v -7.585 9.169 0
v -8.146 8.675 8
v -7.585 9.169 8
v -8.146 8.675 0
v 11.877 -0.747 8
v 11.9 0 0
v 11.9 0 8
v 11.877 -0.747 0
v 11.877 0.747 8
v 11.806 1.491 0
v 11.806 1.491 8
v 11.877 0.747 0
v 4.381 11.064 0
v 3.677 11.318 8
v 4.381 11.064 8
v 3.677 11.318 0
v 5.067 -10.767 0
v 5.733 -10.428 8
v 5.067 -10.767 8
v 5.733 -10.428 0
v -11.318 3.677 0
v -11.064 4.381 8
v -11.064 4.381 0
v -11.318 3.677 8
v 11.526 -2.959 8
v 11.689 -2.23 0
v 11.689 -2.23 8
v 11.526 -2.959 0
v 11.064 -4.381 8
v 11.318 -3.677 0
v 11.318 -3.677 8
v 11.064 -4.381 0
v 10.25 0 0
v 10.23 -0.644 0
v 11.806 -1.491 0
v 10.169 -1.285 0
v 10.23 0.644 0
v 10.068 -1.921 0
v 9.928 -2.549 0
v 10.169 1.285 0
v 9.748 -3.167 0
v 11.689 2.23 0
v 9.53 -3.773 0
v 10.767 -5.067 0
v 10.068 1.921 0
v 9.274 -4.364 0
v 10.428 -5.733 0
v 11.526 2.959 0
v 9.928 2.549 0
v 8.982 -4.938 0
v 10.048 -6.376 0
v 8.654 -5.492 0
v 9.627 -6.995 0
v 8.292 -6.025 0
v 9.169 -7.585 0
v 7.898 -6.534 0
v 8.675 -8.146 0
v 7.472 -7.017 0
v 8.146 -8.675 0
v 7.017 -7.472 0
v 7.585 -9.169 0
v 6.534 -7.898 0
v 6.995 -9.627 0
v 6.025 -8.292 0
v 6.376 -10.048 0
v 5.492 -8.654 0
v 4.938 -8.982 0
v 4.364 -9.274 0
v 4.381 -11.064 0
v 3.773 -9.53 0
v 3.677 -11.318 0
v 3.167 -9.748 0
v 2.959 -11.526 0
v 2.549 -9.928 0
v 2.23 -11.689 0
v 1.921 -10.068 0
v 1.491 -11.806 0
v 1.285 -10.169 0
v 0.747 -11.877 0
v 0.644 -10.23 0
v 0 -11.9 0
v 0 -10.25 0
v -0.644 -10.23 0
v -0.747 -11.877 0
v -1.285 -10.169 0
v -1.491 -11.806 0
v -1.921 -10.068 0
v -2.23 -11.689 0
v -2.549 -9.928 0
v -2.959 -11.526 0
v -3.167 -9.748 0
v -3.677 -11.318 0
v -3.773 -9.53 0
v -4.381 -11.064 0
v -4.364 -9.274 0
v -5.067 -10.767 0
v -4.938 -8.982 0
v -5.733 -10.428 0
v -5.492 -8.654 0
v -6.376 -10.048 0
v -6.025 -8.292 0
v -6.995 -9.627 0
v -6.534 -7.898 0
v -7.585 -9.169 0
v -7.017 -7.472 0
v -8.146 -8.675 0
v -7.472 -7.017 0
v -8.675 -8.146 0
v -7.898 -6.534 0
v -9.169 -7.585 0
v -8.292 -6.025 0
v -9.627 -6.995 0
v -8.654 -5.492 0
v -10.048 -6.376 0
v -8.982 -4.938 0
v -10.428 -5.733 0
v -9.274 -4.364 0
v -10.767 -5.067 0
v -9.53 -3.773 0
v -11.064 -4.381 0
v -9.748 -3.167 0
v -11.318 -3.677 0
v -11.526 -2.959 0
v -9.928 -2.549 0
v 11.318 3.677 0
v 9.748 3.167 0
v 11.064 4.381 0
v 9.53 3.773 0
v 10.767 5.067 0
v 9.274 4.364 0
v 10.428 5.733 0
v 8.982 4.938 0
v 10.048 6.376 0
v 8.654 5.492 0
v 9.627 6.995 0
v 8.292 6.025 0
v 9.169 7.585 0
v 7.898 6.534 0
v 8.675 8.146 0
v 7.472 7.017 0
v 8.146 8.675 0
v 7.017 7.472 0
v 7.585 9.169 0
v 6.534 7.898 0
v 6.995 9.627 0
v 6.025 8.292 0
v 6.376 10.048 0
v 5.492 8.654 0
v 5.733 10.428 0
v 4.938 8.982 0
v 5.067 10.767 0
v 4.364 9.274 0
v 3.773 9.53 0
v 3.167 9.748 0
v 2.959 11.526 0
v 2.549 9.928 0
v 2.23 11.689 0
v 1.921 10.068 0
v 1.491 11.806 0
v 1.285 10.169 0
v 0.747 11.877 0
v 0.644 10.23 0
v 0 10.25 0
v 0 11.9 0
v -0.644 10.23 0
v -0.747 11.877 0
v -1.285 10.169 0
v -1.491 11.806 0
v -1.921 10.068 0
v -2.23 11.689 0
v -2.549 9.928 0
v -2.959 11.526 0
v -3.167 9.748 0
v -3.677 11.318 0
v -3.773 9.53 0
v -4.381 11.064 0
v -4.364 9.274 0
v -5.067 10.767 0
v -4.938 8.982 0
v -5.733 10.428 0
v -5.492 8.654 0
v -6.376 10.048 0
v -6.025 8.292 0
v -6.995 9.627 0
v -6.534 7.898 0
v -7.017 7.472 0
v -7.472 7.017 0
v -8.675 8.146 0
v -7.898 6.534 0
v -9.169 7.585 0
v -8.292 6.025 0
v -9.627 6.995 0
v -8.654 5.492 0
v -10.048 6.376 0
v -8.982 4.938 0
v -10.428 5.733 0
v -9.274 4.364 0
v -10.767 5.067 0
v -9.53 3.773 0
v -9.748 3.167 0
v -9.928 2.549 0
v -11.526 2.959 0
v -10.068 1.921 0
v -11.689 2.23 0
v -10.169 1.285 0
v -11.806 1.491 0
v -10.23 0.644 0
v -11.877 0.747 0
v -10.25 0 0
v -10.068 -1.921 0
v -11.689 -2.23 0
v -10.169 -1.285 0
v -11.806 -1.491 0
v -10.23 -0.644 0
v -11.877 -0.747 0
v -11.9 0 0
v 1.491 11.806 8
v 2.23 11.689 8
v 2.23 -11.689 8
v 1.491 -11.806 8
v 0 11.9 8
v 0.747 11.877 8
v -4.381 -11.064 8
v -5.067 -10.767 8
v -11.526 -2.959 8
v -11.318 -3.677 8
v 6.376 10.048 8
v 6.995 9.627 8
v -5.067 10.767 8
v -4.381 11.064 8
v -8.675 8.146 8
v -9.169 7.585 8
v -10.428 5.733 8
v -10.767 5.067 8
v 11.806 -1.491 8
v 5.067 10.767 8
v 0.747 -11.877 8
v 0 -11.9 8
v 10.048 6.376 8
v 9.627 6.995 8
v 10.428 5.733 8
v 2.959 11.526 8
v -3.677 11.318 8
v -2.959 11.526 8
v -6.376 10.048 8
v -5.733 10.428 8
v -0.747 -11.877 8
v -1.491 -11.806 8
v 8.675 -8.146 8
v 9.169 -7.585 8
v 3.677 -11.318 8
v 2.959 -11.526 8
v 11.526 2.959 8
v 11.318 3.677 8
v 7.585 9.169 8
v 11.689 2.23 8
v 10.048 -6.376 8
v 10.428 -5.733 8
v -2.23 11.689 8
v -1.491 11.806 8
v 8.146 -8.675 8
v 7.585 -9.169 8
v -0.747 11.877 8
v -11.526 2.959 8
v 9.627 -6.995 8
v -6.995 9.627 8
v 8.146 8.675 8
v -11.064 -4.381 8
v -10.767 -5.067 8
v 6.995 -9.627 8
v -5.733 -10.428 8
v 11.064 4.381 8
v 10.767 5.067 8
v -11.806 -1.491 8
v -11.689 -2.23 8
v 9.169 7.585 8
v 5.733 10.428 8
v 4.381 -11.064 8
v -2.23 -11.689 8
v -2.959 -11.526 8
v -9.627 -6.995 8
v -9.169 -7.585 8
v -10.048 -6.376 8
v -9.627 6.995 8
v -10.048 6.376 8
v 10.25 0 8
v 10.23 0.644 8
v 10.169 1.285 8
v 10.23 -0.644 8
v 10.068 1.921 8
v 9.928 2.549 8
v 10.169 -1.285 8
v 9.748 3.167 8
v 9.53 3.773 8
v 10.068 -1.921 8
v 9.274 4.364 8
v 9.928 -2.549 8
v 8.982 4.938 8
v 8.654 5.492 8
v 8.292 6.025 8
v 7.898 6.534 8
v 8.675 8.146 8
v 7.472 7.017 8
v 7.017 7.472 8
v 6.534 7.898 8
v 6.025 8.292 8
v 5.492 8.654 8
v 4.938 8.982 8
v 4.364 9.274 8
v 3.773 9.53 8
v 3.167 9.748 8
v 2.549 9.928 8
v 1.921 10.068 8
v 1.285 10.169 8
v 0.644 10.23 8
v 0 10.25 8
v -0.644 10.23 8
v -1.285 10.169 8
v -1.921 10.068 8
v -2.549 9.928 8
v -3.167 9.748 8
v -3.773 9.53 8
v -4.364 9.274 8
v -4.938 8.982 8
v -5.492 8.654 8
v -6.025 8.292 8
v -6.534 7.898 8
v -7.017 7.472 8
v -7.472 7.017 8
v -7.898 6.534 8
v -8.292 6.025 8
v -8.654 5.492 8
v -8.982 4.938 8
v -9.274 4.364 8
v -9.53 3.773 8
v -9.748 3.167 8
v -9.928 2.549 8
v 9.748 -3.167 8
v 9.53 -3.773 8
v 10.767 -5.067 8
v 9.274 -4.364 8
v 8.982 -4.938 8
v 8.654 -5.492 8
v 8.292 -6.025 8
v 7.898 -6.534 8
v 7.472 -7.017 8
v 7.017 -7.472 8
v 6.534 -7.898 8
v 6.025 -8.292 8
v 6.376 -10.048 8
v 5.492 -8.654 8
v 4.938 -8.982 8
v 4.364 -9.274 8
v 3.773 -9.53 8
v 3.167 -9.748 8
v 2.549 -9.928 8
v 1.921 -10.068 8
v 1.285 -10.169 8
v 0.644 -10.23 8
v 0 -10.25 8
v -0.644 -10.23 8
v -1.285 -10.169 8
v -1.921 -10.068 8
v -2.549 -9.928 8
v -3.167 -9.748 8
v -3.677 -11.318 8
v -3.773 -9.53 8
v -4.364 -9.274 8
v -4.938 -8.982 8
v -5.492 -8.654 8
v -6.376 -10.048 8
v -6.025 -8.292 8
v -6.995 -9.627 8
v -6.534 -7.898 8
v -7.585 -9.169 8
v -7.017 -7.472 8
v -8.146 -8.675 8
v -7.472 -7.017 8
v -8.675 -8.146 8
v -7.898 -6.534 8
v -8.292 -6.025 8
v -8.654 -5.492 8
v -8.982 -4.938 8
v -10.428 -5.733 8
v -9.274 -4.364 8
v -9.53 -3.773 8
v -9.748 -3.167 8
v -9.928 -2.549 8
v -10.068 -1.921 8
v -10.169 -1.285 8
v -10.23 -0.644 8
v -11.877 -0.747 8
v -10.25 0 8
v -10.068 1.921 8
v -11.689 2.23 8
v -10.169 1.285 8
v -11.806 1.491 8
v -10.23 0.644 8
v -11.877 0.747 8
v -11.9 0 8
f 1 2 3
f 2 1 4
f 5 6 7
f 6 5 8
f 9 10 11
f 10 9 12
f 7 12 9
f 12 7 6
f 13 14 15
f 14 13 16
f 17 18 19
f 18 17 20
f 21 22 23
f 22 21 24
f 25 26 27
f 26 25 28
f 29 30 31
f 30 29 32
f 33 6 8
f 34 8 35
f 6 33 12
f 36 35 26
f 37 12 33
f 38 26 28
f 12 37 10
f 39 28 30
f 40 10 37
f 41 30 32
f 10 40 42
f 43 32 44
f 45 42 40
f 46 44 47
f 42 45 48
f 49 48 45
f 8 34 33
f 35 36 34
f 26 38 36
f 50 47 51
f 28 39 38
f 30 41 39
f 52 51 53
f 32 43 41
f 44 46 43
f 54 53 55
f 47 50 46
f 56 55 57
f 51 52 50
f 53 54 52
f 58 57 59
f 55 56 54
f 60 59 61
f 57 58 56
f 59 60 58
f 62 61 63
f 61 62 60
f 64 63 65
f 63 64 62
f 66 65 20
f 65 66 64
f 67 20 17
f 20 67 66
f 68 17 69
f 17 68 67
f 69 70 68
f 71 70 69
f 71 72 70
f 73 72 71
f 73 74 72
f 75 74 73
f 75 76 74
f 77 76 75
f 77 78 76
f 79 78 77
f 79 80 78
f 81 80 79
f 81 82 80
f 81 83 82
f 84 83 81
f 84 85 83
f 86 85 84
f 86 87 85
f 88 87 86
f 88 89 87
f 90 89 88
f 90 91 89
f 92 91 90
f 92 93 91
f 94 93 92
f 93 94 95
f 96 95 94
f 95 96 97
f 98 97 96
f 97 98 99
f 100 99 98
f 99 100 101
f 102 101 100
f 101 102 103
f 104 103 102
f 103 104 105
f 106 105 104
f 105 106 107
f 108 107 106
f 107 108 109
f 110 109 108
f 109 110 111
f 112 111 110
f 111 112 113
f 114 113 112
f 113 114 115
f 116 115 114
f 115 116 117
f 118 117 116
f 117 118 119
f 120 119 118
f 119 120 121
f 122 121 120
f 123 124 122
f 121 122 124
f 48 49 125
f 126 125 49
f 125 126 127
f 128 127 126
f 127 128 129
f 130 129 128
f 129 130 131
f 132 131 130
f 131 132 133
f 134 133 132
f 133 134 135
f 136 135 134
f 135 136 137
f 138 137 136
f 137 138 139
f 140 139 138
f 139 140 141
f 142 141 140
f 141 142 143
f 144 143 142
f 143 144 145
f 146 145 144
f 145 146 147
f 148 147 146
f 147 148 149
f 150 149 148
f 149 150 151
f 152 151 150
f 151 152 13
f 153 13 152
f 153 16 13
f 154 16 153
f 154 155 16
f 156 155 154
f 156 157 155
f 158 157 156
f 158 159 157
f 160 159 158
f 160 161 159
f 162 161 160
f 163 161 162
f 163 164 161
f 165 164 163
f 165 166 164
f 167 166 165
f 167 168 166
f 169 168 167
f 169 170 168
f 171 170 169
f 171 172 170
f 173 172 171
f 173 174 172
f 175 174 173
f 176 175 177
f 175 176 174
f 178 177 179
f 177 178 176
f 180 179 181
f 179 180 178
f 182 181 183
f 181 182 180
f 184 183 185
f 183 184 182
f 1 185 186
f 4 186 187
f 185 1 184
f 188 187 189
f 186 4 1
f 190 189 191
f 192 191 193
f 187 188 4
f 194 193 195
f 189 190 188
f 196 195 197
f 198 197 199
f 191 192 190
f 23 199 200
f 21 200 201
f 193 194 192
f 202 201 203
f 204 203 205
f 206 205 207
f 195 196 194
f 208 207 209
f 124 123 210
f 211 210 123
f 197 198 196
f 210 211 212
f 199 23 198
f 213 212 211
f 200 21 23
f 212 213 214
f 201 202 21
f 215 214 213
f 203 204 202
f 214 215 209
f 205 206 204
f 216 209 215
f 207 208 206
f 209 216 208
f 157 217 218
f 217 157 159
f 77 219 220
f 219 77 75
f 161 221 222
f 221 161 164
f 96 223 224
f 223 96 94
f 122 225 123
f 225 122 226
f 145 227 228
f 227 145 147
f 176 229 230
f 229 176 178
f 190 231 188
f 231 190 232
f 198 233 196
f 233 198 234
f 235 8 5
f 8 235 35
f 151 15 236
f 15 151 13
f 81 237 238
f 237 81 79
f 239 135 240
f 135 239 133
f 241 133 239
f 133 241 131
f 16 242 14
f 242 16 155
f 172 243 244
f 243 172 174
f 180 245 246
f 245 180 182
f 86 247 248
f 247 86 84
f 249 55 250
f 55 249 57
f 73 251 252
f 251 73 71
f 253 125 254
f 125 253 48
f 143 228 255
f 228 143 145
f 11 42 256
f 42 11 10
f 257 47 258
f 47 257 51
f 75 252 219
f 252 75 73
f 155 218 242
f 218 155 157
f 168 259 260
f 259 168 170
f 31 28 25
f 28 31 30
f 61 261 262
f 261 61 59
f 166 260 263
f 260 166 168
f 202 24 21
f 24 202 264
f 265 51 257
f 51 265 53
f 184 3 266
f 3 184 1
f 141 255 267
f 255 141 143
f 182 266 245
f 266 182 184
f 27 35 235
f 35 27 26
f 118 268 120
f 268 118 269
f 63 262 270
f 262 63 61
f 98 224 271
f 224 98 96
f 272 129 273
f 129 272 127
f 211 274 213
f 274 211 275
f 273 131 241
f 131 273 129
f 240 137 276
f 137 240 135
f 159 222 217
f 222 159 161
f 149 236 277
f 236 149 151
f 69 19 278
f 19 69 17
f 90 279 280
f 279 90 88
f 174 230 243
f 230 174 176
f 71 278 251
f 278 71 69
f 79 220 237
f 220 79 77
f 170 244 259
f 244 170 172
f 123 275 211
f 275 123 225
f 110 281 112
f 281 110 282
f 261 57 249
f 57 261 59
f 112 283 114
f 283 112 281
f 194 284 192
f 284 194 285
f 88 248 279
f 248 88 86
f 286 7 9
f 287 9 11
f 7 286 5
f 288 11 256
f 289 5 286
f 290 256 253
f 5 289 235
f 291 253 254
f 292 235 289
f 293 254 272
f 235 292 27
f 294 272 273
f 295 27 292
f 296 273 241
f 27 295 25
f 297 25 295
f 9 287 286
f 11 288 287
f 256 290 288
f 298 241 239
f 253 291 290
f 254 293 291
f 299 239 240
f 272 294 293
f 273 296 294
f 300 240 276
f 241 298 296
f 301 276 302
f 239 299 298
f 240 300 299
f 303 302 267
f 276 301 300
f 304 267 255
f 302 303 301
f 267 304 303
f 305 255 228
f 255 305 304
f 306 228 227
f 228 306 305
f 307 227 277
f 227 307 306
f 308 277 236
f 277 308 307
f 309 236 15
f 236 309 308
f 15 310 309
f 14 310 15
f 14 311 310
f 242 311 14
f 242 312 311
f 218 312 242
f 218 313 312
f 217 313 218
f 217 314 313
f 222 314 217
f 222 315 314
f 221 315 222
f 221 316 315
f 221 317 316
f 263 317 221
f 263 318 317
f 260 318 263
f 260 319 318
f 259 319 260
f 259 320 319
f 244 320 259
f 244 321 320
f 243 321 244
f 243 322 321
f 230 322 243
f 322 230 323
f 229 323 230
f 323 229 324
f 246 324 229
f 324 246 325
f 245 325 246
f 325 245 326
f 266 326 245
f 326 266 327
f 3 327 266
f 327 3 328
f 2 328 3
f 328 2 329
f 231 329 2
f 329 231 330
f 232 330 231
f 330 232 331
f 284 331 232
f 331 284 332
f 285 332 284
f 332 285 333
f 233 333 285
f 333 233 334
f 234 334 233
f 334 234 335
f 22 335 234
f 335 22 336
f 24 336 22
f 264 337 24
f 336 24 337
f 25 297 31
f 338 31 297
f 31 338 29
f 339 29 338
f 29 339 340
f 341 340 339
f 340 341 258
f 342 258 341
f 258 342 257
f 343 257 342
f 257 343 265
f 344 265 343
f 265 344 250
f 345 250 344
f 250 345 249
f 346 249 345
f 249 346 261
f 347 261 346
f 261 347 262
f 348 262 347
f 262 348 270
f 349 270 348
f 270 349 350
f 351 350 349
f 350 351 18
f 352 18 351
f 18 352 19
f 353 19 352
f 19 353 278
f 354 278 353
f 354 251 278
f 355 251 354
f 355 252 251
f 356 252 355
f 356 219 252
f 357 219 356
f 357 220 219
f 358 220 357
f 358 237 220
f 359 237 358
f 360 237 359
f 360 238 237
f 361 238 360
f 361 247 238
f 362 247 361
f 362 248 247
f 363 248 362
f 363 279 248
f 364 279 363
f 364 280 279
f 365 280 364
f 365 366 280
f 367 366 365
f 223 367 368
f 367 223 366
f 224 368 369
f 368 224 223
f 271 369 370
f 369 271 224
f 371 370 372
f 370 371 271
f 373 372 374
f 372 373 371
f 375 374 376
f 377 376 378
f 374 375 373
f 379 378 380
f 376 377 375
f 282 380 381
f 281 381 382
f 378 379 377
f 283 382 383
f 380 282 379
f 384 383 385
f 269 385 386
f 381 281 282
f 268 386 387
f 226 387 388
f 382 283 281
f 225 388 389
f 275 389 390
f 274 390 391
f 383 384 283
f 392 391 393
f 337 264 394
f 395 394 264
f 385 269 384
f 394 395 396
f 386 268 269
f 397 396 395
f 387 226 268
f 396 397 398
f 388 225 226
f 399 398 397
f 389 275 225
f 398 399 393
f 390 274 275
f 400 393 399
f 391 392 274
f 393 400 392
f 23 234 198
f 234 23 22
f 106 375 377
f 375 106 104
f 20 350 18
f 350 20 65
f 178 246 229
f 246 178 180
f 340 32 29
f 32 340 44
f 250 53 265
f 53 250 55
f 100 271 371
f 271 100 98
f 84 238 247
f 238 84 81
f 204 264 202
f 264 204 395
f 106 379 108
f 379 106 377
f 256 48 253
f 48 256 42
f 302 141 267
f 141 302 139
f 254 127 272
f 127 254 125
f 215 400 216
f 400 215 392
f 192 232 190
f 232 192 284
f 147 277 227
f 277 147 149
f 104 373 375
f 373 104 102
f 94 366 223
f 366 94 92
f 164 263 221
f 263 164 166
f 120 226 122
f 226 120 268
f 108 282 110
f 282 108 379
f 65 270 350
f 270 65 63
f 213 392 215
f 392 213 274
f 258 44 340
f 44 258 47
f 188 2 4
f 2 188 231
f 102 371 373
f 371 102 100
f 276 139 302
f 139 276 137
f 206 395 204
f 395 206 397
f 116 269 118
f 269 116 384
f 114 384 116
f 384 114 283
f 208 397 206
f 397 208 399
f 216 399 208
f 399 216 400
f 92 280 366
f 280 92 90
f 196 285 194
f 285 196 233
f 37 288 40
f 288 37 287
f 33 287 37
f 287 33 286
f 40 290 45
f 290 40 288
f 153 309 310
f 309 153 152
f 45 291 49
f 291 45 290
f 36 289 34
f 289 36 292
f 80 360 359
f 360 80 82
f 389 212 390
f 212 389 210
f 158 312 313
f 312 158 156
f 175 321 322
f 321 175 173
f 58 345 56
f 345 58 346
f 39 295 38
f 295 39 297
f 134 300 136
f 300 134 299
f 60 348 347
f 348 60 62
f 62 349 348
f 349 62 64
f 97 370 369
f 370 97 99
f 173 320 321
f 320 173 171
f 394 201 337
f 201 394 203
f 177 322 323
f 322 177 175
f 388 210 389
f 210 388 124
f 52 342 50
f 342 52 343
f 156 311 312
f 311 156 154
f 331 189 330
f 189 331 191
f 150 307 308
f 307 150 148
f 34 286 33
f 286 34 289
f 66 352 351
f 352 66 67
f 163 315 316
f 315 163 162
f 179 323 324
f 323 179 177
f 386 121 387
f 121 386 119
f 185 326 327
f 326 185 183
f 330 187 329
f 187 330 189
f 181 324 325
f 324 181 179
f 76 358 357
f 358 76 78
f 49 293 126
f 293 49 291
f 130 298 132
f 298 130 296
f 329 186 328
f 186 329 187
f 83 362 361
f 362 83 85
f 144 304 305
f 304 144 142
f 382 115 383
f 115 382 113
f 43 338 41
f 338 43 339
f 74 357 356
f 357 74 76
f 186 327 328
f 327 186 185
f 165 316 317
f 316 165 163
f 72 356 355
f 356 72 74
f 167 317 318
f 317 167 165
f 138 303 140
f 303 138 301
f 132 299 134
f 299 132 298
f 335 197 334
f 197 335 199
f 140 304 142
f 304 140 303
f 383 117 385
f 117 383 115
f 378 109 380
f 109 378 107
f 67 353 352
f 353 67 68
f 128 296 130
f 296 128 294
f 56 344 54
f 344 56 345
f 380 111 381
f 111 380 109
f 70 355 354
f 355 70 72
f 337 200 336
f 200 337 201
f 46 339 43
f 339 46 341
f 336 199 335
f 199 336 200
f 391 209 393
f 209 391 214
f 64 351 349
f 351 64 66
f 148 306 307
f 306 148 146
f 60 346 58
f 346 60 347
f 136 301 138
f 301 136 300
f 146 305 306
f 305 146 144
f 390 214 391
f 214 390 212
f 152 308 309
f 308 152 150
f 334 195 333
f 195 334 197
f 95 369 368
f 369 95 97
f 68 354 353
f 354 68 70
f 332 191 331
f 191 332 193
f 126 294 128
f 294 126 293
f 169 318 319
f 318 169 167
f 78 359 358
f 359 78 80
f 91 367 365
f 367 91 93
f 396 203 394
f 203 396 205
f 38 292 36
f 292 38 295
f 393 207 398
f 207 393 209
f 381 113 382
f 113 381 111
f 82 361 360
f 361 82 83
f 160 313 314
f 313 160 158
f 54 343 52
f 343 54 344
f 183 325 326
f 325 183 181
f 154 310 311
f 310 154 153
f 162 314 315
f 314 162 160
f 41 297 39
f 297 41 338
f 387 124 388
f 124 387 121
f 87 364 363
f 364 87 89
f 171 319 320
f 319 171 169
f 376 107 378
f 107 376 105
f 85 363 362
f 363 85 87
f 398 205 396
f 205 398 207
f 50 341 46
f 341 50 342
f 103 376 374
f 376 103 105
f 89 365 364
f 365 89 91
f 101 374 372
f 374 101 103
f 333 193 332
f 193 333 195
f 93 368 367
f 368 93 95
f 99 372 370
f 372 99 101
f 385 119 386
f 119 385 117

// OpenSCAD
ringInnerDiameter = 20.5;
ringThickness = 1.65;
ringOuterDiameter = ringInnerDiameter + ringThickness * 2;
ringWidth = 8;

cutHeight = 8;
cutterWidth = 10;

innerWallHeight = 0.8;
innerWallWidth = cutterWidth;

difference() {
    cylinder(h=ringWidth, r=ringOuterDiameter / 2, $fn=100); // outer cylinder     
    cylinder(h=ringWidth * 69, r=ringInnerDiameter / 2, $fn=100); // inner cylinder
    
    translate([-cutterWidth/2, 0, 0]) {
        //cube([cutterWidth, 100, ringWidth]);
    }

}
//translate([-innerWallWidth/2, ringInnerDiameter/2 - 0.7, 0]) { // use maths?
//    cube([innerWallWidth, innerWallHeight, ringWidth]);
//}
